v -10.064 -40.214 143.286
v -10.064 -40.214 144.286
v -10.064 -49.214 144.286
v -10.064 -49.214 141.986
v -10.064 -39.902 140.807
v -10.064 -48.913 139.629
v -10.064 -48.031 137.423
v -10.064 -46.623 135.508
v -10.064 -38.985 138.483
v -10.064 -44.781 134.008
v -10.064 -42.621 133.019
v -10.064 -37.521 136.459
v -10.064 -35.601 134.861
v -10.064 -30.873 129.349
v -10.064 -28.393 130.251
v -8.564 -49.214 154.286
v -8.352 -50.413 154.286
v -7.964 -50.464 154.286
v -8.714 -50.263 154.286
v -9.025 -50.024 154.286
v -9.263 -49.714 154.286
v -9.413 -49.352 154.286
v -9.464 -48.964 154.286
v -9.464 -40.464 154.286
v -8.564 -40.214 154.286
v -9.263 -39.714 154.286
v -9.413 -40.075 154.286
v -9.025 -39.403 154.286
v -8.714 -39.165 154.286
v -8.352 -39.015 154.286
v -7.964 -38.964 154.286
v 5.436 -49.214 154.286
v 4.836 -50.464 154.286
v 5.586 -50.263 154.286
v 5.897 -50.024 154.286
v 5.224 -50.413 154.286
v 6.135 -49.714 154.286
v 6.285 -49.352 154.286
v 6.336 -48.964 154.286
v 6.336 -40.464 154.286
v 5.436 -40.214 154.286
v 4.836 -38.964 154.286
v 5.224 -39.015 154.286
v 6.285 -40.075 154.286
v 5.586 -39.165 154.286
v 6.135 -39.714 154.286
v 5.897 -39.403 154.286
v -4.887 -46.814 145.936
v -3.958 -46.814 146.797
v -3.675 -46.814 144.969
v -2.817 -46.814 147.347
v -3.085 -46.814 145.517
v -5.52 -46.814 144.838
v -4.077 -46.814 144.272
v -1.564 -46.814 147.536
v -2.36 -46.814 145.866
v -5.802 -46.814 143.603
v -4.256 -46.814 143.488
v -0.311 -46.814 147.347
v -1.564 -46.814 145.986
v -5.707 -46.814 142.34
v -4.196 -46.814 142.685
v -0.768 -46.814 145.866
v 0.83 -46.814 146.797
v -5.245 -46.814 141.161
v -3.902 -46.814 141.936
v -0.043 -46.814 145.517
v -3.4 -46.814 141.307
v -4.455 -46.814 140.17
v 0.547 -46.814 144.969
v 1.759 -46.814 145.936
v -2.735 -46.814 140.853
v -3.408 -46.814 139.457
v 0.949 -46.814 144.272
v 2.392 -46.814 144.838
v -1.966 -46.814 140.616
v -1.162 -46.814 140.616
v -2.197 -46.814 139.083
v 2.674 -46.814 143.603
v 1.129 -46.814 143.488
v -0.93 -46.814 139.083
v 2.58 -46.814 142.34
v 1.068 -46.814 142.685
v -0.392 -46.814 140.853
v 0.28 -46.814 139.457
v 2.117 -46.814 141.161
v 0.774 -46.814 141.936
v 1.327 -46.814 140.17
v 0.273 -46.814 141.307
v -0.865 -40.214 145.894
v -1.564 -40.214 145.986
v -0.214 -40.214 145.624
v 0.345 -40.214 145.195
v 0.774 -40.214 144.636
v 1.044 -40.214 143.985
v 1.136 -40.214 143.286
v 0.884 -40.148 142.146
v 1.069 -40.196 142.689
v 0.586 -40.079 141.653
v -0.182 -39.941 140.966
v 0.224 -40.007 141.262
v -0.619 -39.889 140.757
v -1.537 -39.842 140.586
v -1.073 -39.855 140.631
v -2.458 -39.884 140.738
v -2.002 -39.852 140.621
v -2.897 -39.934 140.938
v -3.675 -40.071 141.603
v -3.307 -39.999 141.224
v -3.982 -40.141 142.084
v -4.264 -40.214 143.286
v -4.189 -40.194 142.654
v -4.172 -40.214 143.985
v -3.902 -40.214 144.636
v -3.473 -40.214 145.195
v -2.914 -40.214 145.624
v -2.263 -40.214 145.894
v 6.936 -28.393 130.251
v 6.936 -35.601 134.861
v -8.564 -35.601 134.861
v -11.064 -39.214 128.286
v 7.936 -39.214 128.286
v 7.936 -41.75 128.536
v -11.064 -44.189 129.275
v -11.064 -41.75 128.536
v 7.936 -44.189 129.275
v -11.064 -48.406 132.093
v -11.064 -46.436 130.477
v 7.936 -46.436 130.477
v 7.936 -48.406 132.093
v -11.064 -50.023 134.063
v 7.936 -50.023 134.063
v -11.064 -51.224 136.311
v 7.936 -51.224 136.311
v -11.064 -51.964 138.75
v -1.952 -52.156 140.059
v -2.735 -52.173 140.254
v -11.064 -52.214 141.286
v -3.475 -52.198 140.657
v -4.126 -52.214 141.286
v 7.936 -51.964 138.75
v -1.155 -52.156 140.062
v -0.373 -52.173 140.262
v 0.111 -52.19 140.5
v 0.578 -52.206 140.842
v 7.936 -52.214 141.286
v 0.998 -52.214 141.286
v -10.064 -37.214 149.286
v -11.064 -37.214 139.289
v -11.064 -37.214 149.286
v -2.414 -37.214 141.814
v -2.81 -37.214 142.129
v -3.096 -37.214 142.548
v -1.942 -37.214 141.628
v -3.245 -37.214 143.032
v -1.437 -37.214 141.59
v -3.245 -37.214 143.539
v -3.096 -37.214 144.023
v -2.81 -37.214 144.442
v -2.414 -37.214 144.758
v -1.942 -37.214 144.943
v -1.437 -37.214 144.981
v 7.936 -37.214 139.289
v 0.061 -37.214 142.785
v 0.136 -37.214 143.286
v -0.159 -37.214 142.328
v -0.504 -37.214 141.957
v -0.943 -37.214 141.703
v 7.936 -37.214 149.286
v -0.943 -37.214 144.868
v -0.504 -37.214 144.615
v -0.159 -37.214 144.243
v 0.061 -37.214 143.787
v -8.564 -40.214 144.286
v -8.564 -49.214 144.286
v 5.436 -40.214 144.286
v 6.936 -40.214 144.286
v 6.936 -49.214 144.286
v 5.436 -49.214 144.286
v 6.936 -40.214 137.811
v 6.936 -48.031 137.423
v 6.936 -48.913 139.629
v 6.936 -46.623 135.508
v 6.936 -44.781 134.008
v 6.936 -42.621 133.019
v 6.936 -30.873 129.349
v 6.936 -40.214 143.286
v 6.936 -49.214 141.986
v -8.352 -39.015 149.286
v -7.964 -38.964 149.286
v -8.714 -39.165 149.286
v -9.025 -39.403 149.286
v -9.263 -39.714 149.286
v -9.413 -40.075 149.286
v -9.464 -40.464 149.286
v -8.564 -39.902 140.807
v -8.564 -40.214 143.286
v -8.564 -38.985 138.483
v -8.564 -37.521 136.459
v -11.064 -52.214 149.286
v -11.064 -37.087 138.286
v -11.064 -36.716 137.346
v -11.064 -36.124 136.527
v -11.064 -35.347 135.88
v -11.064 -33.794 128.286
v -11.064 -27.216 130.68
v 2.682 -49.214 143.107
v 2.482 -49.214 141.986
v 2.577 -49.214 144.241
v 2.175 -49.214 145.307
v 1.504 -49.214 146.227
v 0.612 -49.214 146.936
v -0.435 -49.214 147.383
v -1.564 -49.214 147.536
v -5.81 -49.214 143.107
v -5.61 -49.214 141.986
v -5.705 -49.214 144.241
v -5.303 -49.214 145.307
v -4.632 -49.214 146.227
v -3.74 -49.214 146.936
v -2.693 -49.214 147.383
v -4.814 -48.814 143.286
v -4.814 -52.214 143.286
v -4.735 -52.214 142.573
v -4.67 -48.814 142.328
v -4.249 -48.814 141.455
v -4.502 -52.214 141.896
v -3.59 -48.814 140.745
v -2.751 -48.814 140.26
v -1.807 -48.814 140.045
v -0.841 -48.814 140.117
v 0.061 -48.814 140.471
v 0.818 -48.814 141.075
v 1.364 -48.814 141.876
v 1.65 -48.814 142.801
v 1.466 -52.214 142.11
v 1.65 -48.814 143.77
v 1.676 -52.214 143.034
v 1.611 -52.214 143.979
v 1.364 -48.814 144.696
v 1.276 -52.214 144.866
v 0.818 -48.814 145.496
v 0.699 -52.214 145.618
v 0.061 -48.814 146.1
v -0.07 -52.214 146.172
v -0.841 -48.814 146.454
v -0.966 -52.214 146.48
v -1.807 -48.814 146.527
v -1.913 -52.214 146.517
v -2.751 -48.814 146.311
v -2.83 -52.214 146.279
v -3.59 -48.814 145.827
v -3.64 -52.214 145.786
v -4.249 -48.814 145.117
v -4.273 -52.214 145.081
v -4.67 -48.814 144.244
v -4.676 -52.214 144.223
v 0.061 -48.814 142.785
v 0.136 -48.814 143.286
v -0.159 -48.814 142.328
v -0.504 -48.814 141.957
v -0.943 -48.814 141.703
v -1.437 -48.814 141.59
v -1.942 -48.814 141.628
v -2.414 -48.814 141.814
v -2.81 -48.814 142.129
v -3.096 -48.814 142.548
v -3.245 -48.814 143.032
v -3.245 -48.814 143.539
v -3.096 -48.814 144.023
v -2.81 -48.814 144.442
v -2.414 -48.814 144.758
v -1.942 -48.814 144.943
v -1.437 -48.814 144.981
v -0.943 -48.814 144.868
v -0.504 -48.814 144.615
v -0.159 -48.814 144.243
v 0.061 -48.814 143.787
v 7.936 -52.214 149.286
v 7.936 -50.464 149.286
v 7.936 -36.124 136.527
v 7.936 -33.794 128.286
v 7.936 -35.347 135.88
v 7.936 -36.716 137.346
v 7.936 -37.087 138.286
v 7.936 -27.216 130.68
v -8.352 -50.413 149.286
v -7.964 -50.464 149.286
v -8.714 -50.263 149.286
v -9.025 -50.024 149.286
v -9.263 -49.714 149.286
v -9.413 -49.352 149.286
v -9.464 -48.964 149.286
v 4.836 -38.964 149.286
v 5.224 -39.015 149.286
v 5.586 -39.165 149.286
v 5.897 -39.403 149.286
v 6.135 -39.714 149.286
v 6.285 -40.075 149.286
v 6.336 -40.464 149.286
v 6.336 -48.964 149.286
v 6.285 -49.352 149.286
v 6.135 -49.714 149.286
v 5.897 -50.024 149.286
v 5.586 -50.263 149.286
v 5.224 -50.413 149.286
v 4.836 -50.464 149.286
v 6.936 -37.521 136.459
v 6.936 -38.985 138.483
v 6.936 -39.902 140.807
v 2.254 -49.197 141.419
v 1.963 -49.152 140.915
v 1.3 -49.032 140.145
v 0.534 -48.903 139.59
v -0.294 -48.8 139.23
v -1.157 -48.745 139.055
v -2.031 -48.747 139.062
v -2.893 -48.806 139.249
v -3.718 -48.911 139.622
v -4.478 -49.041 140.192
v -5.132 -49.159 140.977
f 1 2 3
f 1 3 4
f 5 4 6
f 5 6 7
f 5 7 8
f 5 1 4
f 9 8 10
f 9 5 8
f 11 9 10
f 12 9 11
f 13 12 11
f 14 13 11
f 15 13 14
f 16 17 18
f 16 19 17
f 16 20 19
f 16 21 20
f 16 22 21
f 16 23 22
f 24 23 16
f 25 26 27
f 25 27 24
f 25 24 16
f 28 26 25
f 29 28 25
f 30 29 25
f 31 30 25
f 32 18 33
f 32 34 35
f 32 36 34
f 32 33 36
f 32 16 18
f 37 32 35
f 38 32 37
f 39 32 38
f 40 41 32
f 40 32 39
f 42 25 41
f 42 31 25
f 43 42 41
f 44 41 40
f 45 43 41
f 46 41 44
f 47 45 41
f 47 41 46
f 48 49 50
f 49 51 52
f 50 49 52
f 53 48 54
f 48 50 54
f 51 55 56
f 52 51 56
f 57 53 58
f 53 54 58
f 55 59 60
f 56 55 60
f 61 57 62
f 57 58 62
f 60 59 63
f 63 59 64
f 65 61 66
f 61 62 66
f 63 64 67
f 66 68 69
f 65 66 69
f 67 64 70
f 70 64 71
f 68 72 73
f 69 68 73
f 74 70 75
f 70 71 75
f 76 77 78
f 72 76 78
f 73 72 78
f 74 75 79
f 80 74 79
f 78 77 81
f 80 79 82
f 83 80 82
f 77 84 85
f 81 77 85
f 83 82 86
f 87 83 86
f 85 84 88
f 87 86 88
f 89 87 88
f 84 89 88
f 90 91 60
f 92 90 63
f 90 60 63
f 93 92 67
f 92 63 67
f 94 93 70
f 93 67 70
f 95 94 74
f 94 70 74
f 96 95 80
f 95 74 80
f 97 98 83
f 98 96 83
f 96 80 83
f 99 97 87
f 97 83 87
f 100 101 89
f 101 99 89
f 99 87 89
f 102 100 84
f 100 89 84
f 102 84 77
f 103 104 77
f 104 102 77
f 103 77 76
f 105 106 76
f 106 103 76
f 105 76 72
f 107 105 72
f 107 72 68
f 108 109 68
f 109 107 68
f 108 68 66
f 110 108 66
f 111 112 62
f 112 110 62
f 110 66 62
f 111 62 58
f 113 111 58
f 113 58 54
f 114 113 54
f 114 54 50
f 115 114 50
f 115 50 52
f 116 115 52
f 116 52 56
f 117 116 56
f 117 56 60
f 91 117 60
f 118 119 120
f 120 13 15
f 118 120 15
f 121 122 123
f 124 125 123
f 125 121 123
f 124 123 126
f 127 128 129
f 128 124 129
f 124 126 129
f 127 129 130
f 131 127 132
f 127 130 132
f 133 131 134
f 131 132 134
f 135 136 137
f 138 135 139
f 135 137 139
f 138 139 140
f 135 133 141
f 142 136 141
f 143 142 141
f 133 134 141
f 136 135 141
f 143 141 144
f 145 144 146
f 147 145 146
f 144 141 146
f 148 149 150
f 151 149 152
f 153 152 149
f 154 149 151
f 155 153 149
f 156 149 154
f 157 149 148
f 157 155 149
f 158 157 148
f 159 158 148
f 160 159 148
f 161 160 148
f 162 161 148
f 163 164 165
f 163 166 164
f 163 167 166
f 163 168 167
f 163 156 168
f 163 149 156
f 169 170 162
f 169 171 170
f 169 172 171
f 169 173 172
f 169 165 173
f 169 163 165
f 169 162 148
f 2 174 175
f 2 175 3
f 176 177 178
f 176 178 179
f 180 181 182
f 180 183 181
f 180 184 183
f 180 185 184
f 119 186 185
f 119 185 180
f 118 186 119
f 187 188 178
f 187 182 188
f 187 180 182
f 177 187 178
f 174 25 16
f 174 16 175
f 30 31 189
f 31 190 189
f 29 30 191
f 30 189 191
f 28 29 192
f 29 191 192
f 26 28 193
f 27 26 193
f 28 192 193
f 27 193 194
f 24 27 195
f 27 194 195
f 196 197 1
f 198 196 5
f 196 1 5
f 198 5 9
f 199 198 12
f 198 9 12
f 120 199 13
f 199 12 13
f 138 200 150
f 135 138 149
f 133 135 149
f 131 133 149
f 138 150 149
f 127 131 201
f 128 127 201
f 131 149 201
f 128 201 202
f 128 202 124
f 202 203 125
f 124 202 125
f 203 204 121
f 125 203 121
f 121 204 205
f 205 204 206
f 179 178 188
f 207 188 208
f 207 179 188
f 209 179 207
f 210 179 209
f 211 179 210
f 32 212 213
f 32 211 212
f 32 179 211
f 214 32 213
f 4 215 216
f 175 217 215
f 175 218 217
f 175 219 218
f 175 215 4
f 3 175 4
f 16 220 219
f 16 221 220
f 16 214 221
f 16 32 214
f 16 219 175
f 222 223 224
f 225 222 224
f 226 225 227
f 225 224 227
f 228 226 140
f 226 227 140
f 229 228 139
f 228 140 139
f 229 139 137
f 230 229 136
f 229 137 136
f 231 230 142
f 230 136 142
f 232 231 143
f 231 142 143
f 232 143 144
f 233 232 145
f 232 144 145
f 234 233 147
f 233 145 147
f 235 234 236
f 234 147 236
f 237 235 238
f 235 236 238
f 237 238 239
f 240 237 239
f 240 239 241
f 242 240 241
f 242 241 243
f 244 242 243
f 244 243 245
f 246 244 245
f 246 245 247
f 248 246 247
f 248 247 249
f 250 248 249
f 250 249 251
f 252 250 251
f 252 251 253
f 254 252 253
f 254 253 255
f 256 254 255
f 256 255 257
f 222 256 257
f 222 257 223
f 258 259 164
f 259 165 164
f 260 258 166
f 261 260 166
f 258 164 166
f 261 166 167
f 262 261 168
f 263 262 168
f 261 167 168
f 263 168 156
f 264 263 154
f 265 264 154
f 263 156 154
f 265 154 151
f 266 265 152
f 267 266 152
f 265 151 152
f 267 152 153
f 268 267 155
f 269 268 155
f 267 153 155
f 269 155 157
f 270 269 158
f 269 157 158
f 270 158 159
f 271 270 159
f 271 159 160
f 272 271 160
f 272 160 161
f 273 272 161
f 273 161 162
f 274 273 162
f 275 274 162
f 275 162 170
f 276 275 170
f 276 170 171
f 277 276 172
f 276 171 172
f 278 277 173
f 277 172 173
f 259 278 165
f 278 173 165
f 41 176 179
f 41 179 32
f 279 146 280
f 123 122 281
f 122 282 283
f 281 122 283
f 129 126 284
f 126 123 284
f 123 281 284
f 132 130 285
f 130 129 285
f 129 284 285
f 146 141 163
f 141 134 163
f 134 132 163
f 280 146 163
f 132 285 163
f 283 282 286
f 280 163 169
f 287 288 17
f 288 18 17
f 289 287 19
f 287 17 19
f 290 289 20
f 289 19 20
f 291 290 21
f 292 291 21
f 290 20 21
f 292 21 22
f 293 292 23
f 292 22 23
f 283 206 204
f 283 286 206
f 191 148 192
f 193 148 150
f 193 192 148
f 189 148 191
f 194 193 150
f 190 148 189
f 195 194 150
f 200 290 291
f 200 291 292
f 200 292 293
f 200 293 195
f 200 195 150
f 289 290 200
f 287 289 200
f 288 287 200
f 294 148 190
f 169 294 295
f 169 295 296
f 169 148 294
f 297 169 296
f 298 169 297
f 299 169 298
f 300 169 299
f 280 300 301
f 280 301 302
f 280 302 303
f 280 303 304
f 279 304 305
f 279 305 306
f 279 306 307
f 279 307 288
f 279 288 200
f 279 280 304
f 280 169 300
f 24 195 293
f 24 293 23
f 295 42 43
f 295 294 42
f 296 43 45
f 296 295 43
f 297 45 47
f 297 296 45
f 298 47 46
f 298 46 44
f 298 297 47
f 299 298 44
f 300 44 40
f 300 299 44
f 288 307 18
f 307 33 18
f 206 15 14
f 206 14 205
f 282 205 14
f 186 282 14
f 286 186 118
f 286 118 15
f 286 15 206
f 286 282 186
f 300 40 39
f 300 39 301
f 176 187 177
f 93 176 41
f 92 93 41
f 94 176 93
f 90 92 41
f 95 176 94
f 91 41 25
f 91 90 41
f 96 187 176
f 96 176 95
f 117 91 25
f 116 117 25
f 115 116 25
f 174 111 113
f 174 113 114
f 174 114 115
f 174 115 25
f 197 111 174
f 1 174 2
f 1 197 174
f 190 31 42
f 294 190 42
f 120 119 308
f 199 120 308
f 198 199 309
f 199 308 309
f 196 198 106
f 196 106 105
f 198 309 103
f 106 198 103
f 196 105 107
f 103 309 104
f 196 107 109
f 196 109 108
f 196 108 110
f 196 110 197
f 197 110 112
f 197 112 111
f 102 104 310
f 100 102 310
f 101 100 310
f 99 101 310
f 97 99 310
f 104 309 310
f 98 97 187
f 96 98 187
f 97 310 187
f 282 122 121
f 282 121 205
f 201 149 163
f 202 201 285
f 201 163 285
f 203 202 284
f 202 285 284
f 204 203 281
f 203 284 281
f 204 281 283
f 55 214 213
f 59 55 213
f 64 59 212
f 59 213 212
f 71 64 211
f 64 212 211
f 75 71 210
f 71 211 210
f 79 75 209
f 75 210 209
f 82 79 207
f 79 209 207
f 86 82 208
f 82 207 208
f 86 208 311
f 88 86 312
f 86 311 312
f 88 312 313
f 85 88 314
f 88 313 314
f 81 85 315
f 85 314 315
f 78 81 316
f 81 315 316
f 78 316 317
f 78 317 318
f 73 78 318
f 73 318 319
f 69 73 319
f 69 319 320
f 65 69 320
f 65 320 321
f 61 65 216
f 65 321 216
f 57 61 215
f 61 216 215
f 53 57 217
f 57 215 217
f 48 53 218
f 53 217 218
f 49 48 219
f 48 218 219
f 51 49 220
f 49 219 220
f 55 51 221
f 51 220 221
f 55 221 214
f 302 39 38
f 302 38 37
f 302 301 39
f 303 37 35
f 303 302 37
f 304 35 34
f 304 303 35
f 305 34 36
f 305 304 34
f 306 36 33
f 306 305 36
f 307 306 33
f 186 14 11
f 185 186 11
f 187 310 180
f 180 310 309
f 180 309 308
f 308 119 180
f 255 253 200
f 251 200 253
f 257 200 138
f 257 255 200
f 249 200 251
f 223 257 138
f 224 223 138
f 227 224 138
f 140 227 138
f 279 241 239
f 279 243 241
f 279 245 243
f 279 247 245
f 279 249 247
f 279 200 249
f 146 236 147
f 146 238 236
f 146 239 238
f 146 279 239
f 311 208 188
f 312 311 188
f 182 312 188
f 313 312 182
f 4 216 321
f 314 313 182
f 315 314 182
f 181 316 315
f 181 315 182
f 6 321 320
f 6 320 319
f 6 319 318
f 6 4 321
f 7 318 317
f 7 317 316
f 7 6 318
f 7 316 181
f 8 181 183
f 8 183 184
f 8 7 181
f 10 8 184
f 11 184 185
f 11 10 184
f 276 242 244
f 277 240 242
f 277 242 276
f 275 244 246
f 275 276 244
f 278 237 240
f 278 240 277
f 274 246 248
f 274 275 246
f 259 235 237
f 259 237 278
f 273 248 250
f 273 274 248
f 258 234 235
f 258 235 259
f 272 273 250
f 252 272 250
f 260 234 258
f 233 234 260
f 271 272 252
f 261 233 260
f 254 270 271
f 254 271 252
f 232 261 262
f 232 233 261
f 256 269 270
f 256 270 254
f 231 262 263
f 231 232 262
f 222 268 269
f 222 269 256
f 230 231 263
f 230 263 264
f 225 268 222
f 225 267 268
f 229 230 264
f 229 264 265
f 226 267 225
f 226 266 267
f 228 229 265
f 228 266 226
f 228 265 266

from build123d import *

# Parameters (mm, degrees)
SALIENTE_EXTRUIR1_DEPTH                              = 18
SALIENTE_EXTRUIR2_DEPTH                              = 12
CORTAR_EXTRUIR1_DEPTH                                = 17
CROQUIS4_W                                           = 16.47485784
CROQUIS4_H                                           = 9
CORTAR_EXTRUIR2_DEPTH                                = 15.5
CORTAR_EXTRUIR3_DEPTH                                = 5
CROQUIS6_W                                           = 18
CROQUIS6_H                                           = 12.211968345
CORTAR_EXTRUIR4_DEPTH                                = 27.564918354
SALIENTE_EXTRUIR3_DEPTH                              = 9
SALIENTE_EXTRUIR4_DEPTH                              = 1.25
CROQUIS9_W                                           = 18
CROQUIS9_H                                           = 21
SALIENTE_EXTRUIR5_DEPTH                              = 1.75
CROQUIS10_W                                          = 1.5
CROQUIS10_H                                          = 9
CORTAR_EXTRUIR5_DEPTH                                = 6.47485784
CROQUIS11_W                                          = 1.5
CROQUIS11_H                                          = 9
CORTAR_EXTRUIR6_DEPTH                                = 6.47485784
SALIENTE_EXTRUIR6_DEPTH                              = 1
NGULO_DE_SALIDA1_ANGLE                               = 32.6
REFRENTADO_PARA_TORNILLO_CON_CABEZA_HEXA_D           = 3.4
REFRENTADO_PARA_TORNILLO_CON_CABEZA_HEXA_DEPTH       = 24.997848167
REFRENTADO_PARA_TORNILLO_CON_CABEZA_HEXA_CBORE_D     = 6.5
REFRENTADO_PARA_TORNILLO_CON_CABEZA_HEXA_CBORE_DEPTH = 3.4
REDONDEO1_R                                          = 1.5
REDONDEO2_R                                          = 4.046592592
REDONDEO3_R                                          = 9.394473
REDONDEO4_R                                          = 10
REDONDEO5_R                                          = 13.000000028


with BuildPart() as part:
    # Croquis1 → Saliente-Extruir1 (new body)
    with BuildSketch(Plane(origin=(7.936078108, 0, 0), x_dir=(0, 0, -1), z_dir=(1, 0, 0))):
        with BuildLine():
            Line((-154.285744598, -37.213626554), (-128.285744598, -37.213626554))
            Line((-128.285744598, -37.213626554), (-128.285744598, -33.793626733))
            Line((-128.285744598, -33.793626733), (-137.073776253, -9.6487082))
            Line((-137.073776253, -9.6487082), (-149.285744598, -9.6487082))
            add(Edge.make_bspline(
                [(-154.285744598, -9.6487082), (-152.619077931, -9.6487082), (-150.952411265, -9.6487082), (-149.285744598, -9.6487082)],
                knots=[0, 0, 0, 0, 1, 1, 1, 1], degree=3))
            add(Edge.make_bspline(
                [(-154.285744598, -9.6487082), (-154.285744598, -18.837014318), (-154.285744598, -28.025320436), (-154.285744598, -37.213626554)],
                knots=[0, 0, 0, 0, 1, 1, 1, 1], degree=3))
        make_face()
    extrude(amount=-SALIENTE_EXTRUIR1_DEPTH)

    # Croquis2 → Saliente-Extruir2 (add)
    with BuildSketch(Plane.XZ.offset(37.213626554)):
        with BuildLine():
            Line((-10.063921892, 154.285744598), (7.936078108, 154.285744598))
            add(Edge.make_bspline(
                [(7.936078108, 154.285744598), (7.936078108, 152.619077931), (7.936078108, 150.952411265), (7.936078108, 149.285744598)],
                knots=[0, 0, 0, 0, 1, 1, 1, 1], degree=3))
            Line((7.936078108, 149.285744598), (7.936078108, 128.285744598))
            Line((7.936078108, 128.285744598), (-10.063921892, 128.285744598))
            Line((-10.063921892, 128.285744598), (-10.063921892, 154.285744598))
        make_face()
    extrude(amount=SALIENTE_EXTRUIR2_DEPTH)

    # Croquis3 → Cortar-Extruir1 (cut)
    with BuildSketch(Plane.ZY.offset(10.063921892)):
        Polygon((135.078487354, -49.213626554), (137.810886758, -49.213626554), (137.810886758, -40.213626554), (130.25136436, -28.393130822), (129.348598898, -30.873458543), align=None)
    extrude(amount=-CORTAR_EXTRUIR1_DEPTH, mode=Mode.SUBTRACT)

    # Croquis4 → Cortar-Extruir2 (cut)
    with BuildSketch(Plane.ZY.offset(10.063921892)):
        with Locations((146.048315678, -44.713626554)):
            Rectangle(CROQUIS4_W, CROQUIS4_H)
    extrude(amount=-CORTAR_EXTRUIR2_DEPTH, mode=Mode.SUBTRACT)

    # Croquis5 → Cortar-Extruir3 (cut)
    with BuildSketch(Plane.XY.offset(154.285744598)):
        with BuildLine():
            Line((-10.063921892, -40.213626554), (-9.463921892, -40.213626554))
            Line((-9.463921892, -40.213626554), (-9.463921892, -38.963626554))
            Line((-9.463921892, -38.963626554), (6.336078108, -38.963626554))
            Line((6.336078108, -38.963626554), (6.336078108, -49.213626554))
            Line((6.336078108, -49.213626554), (7.936078108, -49.213626554))
            Line((7.936078108, -49.213626554), (7.936078108, -37.213626554))
            add(Edge.make_bspline(
                [(7.936078108, -9.6487082), (7.936078108, -18.837014318), (7.936078108, -28.025320436), (7.936078108, -37.213626554)],
                knots=[0, 0, 0, 0, 1, 1, 1, 1], degree=3))
            Line((7.936078108, -9.6487082), (-10.063921892, -9.6487082))
            add(Edge.make_bspline(
                [(-10.063921892, -9.6487082), (-10.063921892, -18.837014318), (-10.063921892, -28.025320436), (-10.063921892, -37.213626554)],
                knots=[0, 0, 0, 0, 1, 1, 1, 1], degree=3))
            Line((-10.063921892, -37.213626554), (-10.063921892, -40.213626554))
        make_face()
    extrude(amount=-CORTAR_EXTRUIR3_DEPTH, mode=Mode.SUBTRACT)

    # Croquis6 → Cortar-Extruir4 (cut)
    with BuildSketch(Plane(origin=(0, -9.6487082, 0), x_dir=(-1, 0, 0), z_dir=(0, 1, 0))):
        with Locations((1.063921892, 143.179760426)):
            Rectangle(CROQUIS6_W, CROQUIS6_H)
    extrude(amount=-CORTAR_EXTRUIR4_DEPTH, mode=Mode.SUBTRACT)

    # Croquis7 → Saliente-Extruir3 (add)
    with BuildSketch(Plane.XZ.offset(40.213626554)):
        Polygon((-9.463921892, 154.285744598), (-8.563921892, 154.285744598), (-8.563921892, 137.810886758), (-10.063921892, 137.810886758), (-10.063921892, 149.285744598), (-9.463921892, 149.285744598), align=None)
    extrude(amount=SALIENTE_EXTRUIR3_DEPTH)

    # Croquis8 → Saliente-Extruir4 (add)
    with BuildSketch(Plane.XZ.offset(49.213626554)):
        Polygon((-9.463921892, 154.285744598), (6.336078108, 154.285744598), (6.336078108, 149.285744598), (7.936078108, 149.285744598), (7.936078108, 128.285744598), (-10.063921892, 128.285744598), (-10.063921892, 149.285744598), (-9.463921892, 149.285744598), align=None)
    extrude(amount=SALIENTE_EXTRUIR4_DEPTH)

    # Croquis9 → Saliente-Extruir5 (add)
    with BuildSketch(Plane.XZ.offset(50.463626554)):
        with Locations((-1.063921892, 138.785744598)):
            Rectangle(CROQUIS9_W, CROQUIS9_H)
    extrude(amount=SALIENTE_EXTRUIR5_DEPTH)

    # Croquis10 → Cortar-Extruir5 (cut)
    with BuildSketch(Plane(origin=(0, 0, 137.810886758), x_dir=(-1, 0, 0), z_dir=(0, 0, -1))):
        with Locations((-6.186078108, -44.713626554)):
            Rectangle(CROQUIS10_W, CROQUIS10_H)
    extrude(amount=-CORTAR_EXTRUIR5_DEPTH, mode=Mode.SUBTRACT)

    # Croquis11 → Cortar-Extruir6 (cut)
    with BuildSketch(Plane(origin=(0, 0, 137.810886758), x_dir=(-1, 0, 0), z_dir=(0, 0, -1))):
        with Locations((9.313921892, -44.713626554)):
            Rectangle(CROQUIS11_W, CROQUIS11_H)
    extrude(amount=-CORTAR_EXTRUIR6_DEPTH, mode=Mode.SUBTRACT)

    # Croquis12 → Saliente-Extruir6 (add)
    with BuildSketch(Plane.ZY.offset(10.063921892)):
        Polygon((149.285744598, -52.213626554), (128.285744598, -52.213626554), (128.285744598, -33.793626733), (137.073776253, -9.6487082), (137.073776253, -37.213626554), (149.285744598, -37.213626554), align=None)
    extrude(amount=SALIENTE_EXTRUIR6_DEPTH)

    # Ángulo de salida1
    ngulo_de_salida1_faces = [part.faces().sort_by_distance(p)[0] for p in [
        (-1.563921892, -23.431167377, 137.073776253),
    ]]
    draft(ngulo_de_salida1_faces, Plane.ZX.offset(-37.213626554), NGULO_DE_SALIDA1_ANGLE)

    # Croquis13 → Revolución1 (revolve)
    with BuildSketch(Plane(origin=(0, 0, 143.285744598), x_dir=(-1, 0, 0), z_dir=(0, 0, -1)), mode=Mode.PRIVATE) as revoluci_n1_sk:
        Polygon((-2.686078108, -49.213626554), (1.563921892, -49.213626554), (1.563921892, -40.213626554), (-1.136078108, -40.213626554), (-1.136078108, -46.813626554), (-2.686078108, -46.813626554), align=None)
    revolve(revoluci_n1_sk.sketch.rotate(Axis((-1.563921892, -49.213626554, 143.285744598), (0, 1, 0)), 270), axis=Axis((-1.563921892, -49.213626554, 143.285744598), (0, 1, 0)))

    # Refrentado para tornillo con cabeza hexagonal de M31
    with Locations(Plane(origin=(0, -52.213626554, 0), x_dir=(-1, 0, 0), z_dir=(0, -1, 0))):
        with Locations((1.563921892, -143.285744598)):
            CounterBoreHole(REFRENTADO_PARA_TORNILLO_CON_CABEZA_HEXA_D / 2, REFRENTADO_PARA_TORNILLO_CON_CABEZA_HEXA_CBORE_D / 2, REFRENTADO_PARA_TORNILLO_CON_CABEZA_HEXA_CBORE_DEPTH, depth=REFRENTADO_PARA_TORNILLO_CON_CABEZA_HEXA_DEPTH)

    # Redondeo1
    redondeo1_edges = [part.edges().sort_by_distance(p)[0] for p in [
        (6.336078108, -50.463626554, 151.785744598),
        (6.336078108, -38.963626554, 151.785744598),
        (-9.463921892, -50.463626554, 151.785744598),
        (-9.463921892, -38.963626554, 151.785744598),
    ]]
    fillet(redondeo1_edges, radius=REDONDEO1_R)

    # Redondeo2
    redondeo2_edges = [part.edges().sort_by_distance(p)[0] for p in [
        (-1.563921892, -37.213626554, 137.073776253),
    ]]
    fillet(redondeo2_edges, radius=REDONDEO2_R)

    # Redondeo3
    # the kernel refuses this fillet: 9.394473 mm, written as the material it adds along each edge
    with BuildSketch(Plane(origin=(-10.063921892, -49.213626554, 135.078487354), x_dir=(0, 0.954500927456638, -0.2982079467157403), z_dir=(1, 0, 0))) as redondeo3_piece_1_section:
        with BuildLine():
            CenterArc((REDONDEO3_R * 0.735245019776, REDONDEO3_R), REDONDEO3_R, 197.35, 72.65)
            Line((-REDONDEO3_R * 0.21925590768, REDONDEO3_R * 0.701792053284), (0, 0))
            Line((0, 0), (REDONDEO3_R * 0.735245019776, 0))
        make_face()
    redondeo3_piece_1 = extrude(amount=17, mode=Mode.PRIVATE)
    redondeo3_piece_1 = redondeo3_piece_1 - Plane(origin=(-1.563921892, -47.780974958, 143.285744598), x_dir=(0, 0, 1), z_dir=(0, -1, 0)) * Cylinder(4.25, 62, mode=Mode.PRIVATE)
    add(redondeo3_piece_1)

    # Redondeo4
    # the kernel refuses this fillet: 10 mm, written as the material it takes off along each edge
    with BuildSketch(Plane(origin=(6.936078108, -40.213626554, 137.810886758), x_dir=(-2.541450920679997e-12, 0, 1.0), z_dir=(-1.0, -2.5749151914609573e-12, -2.5414509206799975e-12))) as redondeo4_piece_1_section:
        with BuildLine():
            CenterArc((REDONDEO4_R * 0.547484008153, REDONDEO4_R), REDONDEO4_R, 212.6, 57.4)
            Line((-REDONDEO4_R * 0.294968388853, REDONDEO4_R * 0.461229214991), (0, 0))
            Line((0, 0), (REDONDEO4_R * 0.547484008153, 0))
        make_face()
    redondeo4_piece_1 = extrude(amount=15.5, mode=Mode.PRIVATE)
    redondeo4_piece_1 = redondeo4_piece_1 - Plane(origin=(-1.563921892, -39.236985305, 143.285744598), x_dir=(0, 0, 1), z_dir=(0, -1, 0)) * Cylinder(2.7, 53, mode=Mode.PRIVATE)
    add(redondeo4_piece_1, mode=Mode.SUBTRACT)
    with BuildSketch(Plane(origin=(-10.063921892, -40.213626554, 137.810886758), x_dir=(0, 0, 1), z_dir=(1, 0, 0))) as redondeo4_piece_2:
        with BuildLine():
            CenterArc((REDONDEO4_R * 0.547484008153, -REDONDEO4_R), REDONDEO4_R, 90, 57.4)
            Line((-REDONDEO4_R * 0.294968388853, -REDONDEO4_R * 0.461229214991), (0, 0))
            Line((0, 0), (REDONDEO4_R * 0.547484008153, 0))
        make_face()
    extrude(amount=1.5, mode=Mode.SUBTRACT)

    # Redondeo5
    # the kernel refuses this fillet: 13.000000028 mm, written as the material it takes off along each edge
    with BuildSketch(Plane(origin=(40.436078177, -52.213626554, 128.285744598), x_dir=(0, 1, 0), z_dir=(-1, 0, 0))) as redondeo5_piece_1:
        with BuildLine():
            CenterArc((REDONDEO5_R, -REDONDEO5_R), REDONDEO5_R, 90, 90)
            Line((0, -REDONDEO5_R), (0, 0))
            Line((0, 0), (REDONDEO5_R, 0))
        make_face()
    extrude(amount=84.000000138, mode=Mode.SUBTRACT)


solid = part.part
